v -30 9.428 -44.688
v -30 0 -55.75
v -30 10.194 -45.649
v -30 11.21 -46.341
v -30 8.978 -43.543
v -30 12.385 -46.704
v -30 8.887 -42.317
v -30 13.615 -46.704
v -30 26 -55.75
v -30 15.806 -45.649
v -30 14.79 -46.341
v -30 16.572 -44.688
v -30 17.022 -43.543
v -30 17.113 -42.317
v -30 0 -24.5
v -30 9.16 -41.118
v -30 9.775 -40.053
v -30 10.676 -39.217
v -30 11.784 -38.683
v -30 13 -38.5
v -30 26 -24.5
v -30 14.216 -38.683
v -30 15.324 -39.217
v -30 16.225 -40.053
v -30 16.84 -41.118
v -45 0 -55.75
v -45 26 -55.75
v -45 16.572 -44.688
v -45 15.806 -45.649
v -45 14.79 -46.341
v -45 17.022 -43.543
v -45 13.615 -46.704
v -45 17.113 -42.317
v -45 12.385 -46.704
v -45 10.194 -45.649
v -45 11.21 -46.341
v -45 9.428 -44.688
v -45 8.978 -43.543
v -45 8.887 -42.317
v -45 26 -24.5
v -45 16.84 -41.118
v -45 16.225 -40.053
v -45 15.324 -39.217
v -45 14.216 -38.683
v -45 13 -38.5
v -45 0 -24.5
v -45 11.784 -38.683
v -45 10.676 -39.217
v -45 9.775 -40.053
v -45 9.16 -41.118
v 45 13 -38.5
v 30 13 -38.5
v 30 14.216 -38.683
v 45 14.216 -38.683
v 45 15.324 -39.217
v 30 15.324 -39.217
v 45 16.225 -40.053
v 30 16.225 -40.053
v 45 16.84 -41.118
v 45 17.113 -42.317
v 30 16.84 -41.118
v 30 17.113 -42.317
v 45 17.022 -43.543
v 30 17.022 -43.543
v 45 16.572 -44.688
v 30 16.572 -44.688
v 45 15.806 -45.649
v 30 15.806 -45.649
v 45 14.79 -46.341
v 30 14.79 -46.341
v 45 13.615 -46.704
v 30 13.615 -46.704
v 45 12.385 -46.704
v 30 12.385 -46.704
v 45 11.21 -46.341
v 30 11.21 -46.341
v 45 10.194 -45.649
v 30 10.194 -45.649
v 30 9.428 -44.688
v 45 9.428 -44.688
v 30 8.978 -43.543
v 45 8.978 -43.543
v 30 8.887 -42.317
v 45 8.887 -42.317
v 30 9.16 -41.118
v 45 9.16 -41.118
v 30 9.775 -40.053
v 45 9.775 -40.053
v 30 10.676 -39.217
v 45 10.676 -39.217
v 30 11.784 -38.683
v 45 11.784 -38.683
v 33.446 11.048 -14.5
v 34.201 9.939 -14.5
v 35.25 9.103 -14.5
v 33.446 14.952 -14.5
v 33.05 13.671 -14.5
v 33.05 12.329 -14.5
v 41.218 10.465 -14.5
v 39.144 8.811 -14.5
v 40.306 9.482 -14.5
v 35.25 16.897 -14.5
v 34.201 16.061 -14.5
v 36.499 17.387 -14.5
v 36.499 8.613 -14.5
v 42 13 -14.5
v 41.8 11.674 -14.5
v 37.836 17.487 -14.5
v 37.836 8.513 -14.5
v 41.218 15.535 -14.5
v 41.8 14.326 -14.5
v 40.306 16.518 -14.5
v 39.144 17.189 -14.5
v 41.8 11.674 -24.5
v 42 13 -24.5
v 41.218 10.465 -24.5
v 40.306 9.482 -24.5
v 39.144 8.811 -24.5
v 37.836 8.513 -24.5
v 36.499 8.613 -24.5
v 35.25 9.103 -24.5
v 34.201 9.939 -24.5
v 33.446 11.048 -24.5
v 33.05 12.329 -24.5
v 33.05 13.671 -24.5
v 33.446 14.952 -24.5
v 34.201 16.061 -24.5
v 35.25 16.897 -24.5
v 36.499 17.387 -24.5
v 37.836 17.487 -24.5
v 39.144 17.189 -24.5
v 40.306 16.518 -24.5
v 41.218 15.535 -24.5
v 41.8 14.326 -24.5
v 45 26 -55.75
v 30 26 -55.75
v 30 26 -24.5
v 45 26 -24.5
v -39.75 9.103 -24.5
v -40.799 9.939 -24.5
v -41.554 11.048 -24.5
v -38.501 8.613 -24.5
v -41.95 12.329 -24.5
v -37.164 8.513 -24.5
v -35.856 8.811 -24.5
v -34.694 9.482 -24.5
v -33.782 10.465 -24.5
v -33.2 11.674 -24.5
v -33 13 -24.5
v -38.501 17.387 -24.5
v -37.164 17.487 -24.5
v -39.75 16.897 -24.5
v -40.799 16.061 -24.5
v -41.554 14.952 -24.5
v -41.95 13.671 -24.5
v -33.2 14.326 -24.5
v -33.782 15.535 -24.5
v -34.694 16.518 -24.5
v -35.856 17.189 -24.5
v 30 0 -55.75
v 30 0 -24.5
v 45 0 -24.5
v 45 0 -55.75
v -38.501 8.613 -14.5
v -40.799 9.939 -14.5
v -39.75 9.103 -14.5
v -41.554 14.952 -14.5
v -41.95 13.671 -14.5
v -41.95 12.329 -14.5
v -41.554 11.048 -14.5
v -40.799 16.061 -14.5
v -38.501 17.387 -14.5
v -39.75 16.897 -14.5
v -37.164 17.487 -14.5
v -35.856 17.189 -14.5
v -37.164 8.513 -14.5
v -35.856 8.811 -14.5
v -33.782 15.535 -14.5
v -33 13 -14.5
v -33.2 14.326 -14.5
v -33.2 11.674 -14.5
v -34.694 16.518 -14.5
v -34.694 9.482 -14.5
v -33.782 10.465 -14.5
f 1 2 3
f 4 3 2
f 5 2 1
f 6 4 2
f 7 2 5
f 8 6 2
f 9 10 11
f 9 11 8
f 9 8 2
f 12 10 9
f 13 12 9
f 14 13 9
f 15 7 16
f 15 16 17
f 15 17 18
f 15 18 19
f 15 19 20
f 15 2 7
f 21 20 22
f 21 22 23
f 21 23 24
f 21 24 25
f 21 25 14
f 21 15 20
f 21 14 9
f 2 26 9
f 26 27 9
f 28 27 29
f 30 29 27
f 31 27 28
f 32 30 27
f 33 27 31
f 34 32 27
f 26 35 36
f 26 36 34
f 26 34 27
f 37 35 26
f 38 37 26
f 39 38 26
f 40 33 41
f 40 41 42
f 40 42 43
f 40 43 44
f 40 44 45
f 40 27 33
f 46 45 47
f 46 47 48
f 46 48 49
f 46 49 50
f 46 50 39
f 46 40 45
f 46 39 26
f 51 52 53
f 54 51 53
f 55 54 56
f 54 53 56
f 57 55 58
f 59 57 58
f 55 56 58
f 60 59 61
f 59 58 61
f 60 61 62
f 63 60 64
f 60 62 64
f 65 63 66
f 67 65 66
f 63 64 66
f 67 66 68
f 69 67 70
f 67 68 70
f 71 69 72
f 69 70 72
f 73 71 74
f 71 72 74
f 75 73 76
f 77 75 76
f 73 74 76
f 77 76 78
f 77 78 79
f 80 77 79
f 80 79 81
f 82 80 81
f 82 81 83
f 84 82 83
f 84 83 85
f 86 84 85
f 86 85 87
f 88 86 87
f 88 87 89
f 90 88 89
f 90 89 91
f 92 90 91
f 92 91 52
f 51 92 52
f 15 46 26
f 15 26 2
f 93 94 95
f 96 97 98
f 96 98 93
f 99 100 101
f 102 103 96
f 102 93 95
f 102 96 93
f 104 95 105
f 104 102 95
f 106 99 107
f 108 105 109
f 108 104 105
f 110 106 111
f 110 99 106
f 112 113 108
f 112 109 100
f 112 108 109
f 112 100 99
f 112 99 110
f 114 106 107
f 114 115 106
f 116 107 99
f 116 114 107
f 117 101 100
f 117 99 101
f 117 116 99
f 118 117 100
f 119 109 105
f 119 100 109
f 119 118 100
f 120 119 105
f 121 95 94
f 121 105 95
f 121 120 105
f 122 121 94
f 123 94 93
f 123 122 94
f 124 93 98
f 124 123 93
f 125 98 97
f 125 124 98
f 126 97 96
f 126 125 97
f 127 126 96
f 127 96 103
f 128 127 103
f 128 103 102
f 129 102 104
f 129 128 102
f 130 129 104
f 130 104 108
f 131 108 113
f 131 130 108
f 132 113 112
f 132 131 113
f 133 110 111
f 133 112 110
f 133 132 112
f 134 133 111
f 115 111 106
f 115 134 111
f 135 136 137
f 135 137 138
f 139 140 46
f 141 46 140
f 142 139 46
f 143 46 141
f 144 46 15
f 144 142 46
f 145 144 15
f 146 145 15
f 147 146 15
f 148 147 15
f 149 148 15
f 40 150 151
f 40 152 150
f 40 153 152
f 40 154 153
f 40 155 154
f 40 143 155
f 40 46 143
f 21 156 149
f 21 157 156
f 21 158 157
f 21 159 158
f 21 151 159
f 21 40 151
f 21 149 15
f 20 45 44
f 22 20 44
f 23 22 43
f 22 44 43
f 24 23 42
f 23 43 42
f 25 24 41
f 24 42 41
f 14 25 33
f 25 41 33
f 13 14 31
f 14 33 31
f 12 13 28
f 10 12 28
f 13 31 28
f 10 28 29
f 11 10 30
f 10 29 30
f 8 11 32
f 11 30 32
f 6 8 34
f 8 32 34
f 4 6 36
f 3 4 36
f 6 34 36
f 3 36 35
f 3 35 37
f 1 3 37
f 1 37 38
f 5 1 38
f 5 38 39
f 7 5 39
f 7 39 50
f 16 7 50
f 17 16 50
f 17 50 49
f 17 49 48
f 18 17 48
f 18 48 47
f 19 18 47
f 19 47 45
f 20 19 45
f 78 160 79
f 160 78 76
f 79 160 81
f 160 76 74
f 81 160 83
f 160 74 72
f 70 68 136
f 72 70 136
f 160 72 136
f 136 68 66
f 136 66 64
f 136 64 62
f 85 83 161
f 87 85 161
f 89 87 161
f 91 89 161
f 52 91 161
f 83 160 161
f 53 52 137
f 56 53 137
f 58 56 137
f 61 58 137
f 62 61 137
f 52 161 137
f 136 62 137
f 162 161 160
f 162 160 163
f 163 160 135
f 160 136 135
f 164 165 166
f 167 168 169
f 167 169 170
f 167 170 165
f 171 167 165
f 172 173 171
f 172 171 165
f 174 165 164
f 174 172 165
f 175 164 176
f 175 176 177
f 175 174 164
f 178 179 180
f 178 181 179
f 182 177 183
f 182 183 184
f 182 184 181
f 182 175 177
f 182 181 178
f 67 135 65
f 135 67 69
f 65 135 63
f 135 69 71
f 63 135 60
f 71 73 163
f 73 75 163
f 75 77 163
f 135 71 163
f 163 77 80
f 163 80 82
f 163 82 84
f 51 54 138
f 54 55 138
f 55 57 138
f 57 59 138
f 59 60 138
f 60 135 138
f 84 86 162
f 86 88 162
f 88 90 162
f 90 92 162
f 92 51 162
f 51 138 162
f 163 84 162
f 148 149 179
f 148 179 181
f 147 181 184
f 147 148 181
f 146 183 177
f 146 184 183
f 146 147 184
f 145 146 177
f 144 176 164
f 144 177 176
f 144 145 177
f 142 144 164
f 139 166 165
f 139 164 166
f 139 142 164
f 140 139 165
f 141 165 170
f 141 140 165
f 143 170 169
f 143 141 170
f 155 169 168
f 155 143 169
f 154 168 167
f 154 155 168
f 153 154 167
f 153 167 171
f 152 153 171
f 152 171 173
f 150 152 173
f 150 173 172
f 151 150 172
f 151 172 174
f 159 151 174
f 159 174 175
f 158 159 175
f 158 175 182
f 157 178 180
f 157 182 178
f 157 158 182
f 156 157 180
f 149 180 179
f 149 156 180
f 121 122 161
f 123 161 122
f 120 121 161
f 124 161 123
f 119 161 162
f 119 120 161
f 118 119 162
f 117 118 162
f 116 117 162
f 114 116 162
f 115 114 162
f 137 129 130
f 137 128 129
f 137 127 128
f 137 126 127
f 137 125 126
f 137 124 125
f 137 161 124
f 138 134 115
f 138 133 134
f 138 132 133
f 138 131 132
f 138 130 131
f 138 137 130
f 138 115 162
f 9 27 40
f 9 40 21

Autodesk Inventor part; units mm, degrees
ref_plane "YZ Plane" through (0, 0, 0) normal (1, 0, 0) x (0, 1, 0)
ref_plane "XZ Plane" through (0, 0, 0) normal (0, 1, 0) x (-1, 0, 0)
ref_plane "XY Plane" through (0, 0, 0) normal (0, 0, 1) x (1, 0, 0)
sketch "Sketch1" plane through (0, 0, 0) normal (0, 1, 0) x (-1, 0, 0)
  line L0 (0, 0) -> (0, -14)
  circle A0 centre (0, -7) radius 8.25
  circle A1 centre (0, -7) radius 10.5
  dimension "d0" = 14
  dimension "d1" = 16.5
  dimension "d2" = 21
extrude "Extrusion1" add sketch "Sketch1" along normal blind 6
sketch "Sketch2" plane through (0, 6, -7) normal (0, 1, 0) x (1, 0, 0)
  line L0 (10.5, -10.5) -> (-10.5, -10.5)
  line L1 (-10.5, -10.5) -> (-10.5, 10.5)
  line L2 (-10.5, 10.5) -> (10.5, 10.5)
  line L3 (10.5, 10.5) -> (10.5, -10.5)
  line L4 (10.5, -10.5) -> (-10.5, 10.5) construction
  line L5 (-10.5, -10.5) -> (10.5, 10.5) construction
  circle A0 centre (0, 0) radius 10.5
  point P0 (0, -7)
extrude "Extrusion2" add sketch "Sketch2" against normal blind 6 contours L0 A0 L3 | L0 L1 A0 | A0 L2 L3 | L1 L2 A0
sketch "Sketch4" plane through (0, 6, 0) normal (0, 1, 0) x (1, 0, 0)
  circle A0 centre (0, 7) radius 8.25 projected
  line L0 (0, 7) -> (0, -0.25)
  line L1 (0, -0.25) -> (-3.937, -0.25)
  line L2 (3.937, -0.25) -> (-3.937, -0.25)
  point P0 (0, 0)
  dimension "d14" = 7.25
extrude "Extrusion4" add sketch "Sketch4" against normal blind 6 contours L1 L2 A0 picked at (1.9893, -0.4987)
pattern_circular "Circular Pattern2" count 6 over 360 about axis through (0, 0, -7) along (0, 1, 0) of "Extrusion4"
sketch "Sketch5" plane through (0, 6, 0) normal (0, 1, 0) x (1, 0, 0)
  line L0 (-4.3102, -0.0345) -> (-8.2472, 6.7845) projected
  line L1 (-6.2787, 3.375) -> (6.2787, 10.625)
  line L2 (4.3102, 14.0345) -> (8.2472, 7.2155) projected
  line L3 (8.2472, 6.7845) -> (4.3102, -0.0345) projected
  line L4 (6.2787, 3.375) -> (-6.2787, 10.625)
  line L5 (-4.3102, 14.0345) -> (-8.2472, 7.2155) projected
  line L6 (3.937, 14.25) -> (-3.937, 14.25) projected
  line L7 (0, 14.25) -> (0, -0.25)
  line L8 (3.937, -0.25) -> (-3.937, -0.25) projected
  circle A0 centre (0, 7) radius 9.625
  line L9 (12.5, 19.5) -> (-12.5, 19.5)
  line L10 (-12.5, 19.5) -> (-12.5, -5.5)
  line L11 (-12.5, -5.5) -> (12.5, -5.5)
  line L12 (12.5, -5.5) -> (12.5, 19.5)
  line L13 (12.5, 19.5) -> (-12.5, -5.5) construction
  line L14 (-12.5, 19.5) -> (12.5, -5.5) construction
  point P0 (0, 0)
  dimension "d20" = 19.25
  dimension "d21" = 25
  dimension "d22" = 25
extrude "Extrusion5" add sketch "Sketch5" along normal blind 20
sketch "Sketch6" plane through (0, 6, 0) normal (0, -1, 0) x (1, 0, 0)
  line L0 (-10.5, -17.5) -> (10.5, -17.5)
  line L1 (10.5, -17.5) -> (10.5, 3.5)
  line L2 (10.5, 3.5) -> (-10.5, 3.5)
  line L3 (-10.5, 3.5) -> (-10.5, -17.5)
  circle A0 centre (0, -7) radius 9.625 projected
  line L4 (-10.5, -17.5) -> (10.5, 3.5) construction
  line L5 (10.5, -17.5) -> (-10.5, 3.5) construction
  line L6 (-12.5, -19.5) -> (12.5, -19.5)
  line L7 (12.5, -19.5) -> (12.5, 5.5)
  line L8 (12.5, 5.5) -> (-12.5, 5.5)
  line L9 (-12.5, 5.5) -> (-12.5, -19.5)
  line L10 (-12.5, -19.5) -> (12.5, 5.5) construction
  line L11 (12.5, -19.5) -> (-12.5, 5.5) construction
  point P0 (0, 0)
extrude "Extrusion6" add sketch "Sketch6" along normal blind 6 contours L9 L8 L7 L6
sketch "Sketch8" plane through (-12.5, 26, 5.5) normal (0, 0, 1) x (1, 0, 0)
  line L0 (0, 0) -> (25, 0)
  line L1 (0, 0) -> (-17.5, 0)
  line L2 (25, 0) -> (42.5, 0)
  line L3 (0, 0) -> (-17.5, 0)
  line L4 (-17.5, 0) -> (-17.5, -26)
  line L5 (-17.5, -26) -> (0, -26)
  line L6 (0, -26) -> (0, 0)
  line L7 (25, 0) -> (42.5, 0)
  line L8 (42.5, 0) -> (42.5, -26)
  line L9 (42.5, -26) -> (25, -26)
  line L10 (25, -26) -> (25, 0)
  point P0 (12.5, -26)
  dimension "d27" = 17.5
  dimension "d28" = 17.5
extrude "Extrusion7" add sketch "Sketch8" against normal blind 25
sketch "Sketch9" plane through (-30, 0, 5.5) normal (0, 0, 1) x (1, 0, 0)
  line L0 (0, 26) -> (-15, 26)
  line L1 (-15, 26) -> (-15, 0)
  line L2 (-15, 0) -> (0, 0)
  line L3 (0, 0) -> (0, 26)
  line L4 (60, 26) -> (75, 26)
  line L5 (75, 26) -> (75, 0)
  line L6 (75, 0) -> (60, 0)
  line L7 (60, 0) -> (60, 26)
  point P0 (30, 0)
  dimension "d31" = 15
  dimension "d32" = 15
extrude "Extrusion8" add sketch "Sketch9" against normal blind 61.25
sketch "Sketch10" plane through (-45, 0, 5.5) normal (-1, 0, 0) x (0, 0, 1)
  line L0 (-61.25, 0) -> (-61.25, 26) projected
  line L1 (-61.25, 13) -> (-35, 13)
  circle A0 centre (-48.125, 13) radius 4.125
  point P0 (-5.5, 0)
  dimension "d35" = 26.25
  dimension "d36" = 8.25
extrude "Extrusion9" cut sketch "Sketch10" against normal through all
sketch "Sketch11" plane through (0, 26, 0) normal (0, 1, 0) x (1, 0, 0)
  line L0 (30, 19.5) -> (30, 24.5)
  line L1 (30, 19.5) -> (30, 55.75) projected
  line L2 (30, 19.5) -> (25, 19.5)
  line L3 (25, 19.5) -> (30, 24.5)
  line L4 (-30, 19.5) -> (-30, 24.5)
  line L5 (-30, 19.5) -> (-30, 55.75) projected
  line L6 (-30, 19.5) -> (-25, 19.5)
  line L7 (30, 19.5) -> (-30, 19.5) projected
  line L8 (-25, 19.5) -> (-30, 24.5)
  point P0 (0, 0)
  dimension "d39" = 5
  dimension "d40" = 5
  dimension "d41" = 5
  dimension "d42" = 5
extrude "Extrusion10" add sketch "Sketch11" against normal blind 26
sketch "Sketch12" plane through (0, 26, 0) normal (0, 1, 0) x (1, 0, 0)
  line L0 (-45, -5.5) -> (-45, 55.75) projected
  line L1 (45, -5.5) -> (-45, -5.5)
  line L2 (-45, -5.5) -> (-45, 24.5)
  line L3 (-45, 24.5) -> (45, 24.5)
  line L4 (45, 24.5) -> (45, -5.5)
  point P0 (0, 0)
extrude "Extrusion11" cut sketch "Sketch12" against normal through all
sketch "Sketch13" plane through (-45, 26, -24.5) normal (0, 0, 1) x (1, 0, 0)
  circle A0 centre (7.5, -13) radius 4.5
  circle A1 centre (82.5, -13) radius 4.5
  point P0 (45, -26)
  dimension "d47" = 9
  dimension "d48" = 9
extrude "Extrusion12" add sketch "Sketch13" along normal blind 10
properties part number "FretterMountBottom"
